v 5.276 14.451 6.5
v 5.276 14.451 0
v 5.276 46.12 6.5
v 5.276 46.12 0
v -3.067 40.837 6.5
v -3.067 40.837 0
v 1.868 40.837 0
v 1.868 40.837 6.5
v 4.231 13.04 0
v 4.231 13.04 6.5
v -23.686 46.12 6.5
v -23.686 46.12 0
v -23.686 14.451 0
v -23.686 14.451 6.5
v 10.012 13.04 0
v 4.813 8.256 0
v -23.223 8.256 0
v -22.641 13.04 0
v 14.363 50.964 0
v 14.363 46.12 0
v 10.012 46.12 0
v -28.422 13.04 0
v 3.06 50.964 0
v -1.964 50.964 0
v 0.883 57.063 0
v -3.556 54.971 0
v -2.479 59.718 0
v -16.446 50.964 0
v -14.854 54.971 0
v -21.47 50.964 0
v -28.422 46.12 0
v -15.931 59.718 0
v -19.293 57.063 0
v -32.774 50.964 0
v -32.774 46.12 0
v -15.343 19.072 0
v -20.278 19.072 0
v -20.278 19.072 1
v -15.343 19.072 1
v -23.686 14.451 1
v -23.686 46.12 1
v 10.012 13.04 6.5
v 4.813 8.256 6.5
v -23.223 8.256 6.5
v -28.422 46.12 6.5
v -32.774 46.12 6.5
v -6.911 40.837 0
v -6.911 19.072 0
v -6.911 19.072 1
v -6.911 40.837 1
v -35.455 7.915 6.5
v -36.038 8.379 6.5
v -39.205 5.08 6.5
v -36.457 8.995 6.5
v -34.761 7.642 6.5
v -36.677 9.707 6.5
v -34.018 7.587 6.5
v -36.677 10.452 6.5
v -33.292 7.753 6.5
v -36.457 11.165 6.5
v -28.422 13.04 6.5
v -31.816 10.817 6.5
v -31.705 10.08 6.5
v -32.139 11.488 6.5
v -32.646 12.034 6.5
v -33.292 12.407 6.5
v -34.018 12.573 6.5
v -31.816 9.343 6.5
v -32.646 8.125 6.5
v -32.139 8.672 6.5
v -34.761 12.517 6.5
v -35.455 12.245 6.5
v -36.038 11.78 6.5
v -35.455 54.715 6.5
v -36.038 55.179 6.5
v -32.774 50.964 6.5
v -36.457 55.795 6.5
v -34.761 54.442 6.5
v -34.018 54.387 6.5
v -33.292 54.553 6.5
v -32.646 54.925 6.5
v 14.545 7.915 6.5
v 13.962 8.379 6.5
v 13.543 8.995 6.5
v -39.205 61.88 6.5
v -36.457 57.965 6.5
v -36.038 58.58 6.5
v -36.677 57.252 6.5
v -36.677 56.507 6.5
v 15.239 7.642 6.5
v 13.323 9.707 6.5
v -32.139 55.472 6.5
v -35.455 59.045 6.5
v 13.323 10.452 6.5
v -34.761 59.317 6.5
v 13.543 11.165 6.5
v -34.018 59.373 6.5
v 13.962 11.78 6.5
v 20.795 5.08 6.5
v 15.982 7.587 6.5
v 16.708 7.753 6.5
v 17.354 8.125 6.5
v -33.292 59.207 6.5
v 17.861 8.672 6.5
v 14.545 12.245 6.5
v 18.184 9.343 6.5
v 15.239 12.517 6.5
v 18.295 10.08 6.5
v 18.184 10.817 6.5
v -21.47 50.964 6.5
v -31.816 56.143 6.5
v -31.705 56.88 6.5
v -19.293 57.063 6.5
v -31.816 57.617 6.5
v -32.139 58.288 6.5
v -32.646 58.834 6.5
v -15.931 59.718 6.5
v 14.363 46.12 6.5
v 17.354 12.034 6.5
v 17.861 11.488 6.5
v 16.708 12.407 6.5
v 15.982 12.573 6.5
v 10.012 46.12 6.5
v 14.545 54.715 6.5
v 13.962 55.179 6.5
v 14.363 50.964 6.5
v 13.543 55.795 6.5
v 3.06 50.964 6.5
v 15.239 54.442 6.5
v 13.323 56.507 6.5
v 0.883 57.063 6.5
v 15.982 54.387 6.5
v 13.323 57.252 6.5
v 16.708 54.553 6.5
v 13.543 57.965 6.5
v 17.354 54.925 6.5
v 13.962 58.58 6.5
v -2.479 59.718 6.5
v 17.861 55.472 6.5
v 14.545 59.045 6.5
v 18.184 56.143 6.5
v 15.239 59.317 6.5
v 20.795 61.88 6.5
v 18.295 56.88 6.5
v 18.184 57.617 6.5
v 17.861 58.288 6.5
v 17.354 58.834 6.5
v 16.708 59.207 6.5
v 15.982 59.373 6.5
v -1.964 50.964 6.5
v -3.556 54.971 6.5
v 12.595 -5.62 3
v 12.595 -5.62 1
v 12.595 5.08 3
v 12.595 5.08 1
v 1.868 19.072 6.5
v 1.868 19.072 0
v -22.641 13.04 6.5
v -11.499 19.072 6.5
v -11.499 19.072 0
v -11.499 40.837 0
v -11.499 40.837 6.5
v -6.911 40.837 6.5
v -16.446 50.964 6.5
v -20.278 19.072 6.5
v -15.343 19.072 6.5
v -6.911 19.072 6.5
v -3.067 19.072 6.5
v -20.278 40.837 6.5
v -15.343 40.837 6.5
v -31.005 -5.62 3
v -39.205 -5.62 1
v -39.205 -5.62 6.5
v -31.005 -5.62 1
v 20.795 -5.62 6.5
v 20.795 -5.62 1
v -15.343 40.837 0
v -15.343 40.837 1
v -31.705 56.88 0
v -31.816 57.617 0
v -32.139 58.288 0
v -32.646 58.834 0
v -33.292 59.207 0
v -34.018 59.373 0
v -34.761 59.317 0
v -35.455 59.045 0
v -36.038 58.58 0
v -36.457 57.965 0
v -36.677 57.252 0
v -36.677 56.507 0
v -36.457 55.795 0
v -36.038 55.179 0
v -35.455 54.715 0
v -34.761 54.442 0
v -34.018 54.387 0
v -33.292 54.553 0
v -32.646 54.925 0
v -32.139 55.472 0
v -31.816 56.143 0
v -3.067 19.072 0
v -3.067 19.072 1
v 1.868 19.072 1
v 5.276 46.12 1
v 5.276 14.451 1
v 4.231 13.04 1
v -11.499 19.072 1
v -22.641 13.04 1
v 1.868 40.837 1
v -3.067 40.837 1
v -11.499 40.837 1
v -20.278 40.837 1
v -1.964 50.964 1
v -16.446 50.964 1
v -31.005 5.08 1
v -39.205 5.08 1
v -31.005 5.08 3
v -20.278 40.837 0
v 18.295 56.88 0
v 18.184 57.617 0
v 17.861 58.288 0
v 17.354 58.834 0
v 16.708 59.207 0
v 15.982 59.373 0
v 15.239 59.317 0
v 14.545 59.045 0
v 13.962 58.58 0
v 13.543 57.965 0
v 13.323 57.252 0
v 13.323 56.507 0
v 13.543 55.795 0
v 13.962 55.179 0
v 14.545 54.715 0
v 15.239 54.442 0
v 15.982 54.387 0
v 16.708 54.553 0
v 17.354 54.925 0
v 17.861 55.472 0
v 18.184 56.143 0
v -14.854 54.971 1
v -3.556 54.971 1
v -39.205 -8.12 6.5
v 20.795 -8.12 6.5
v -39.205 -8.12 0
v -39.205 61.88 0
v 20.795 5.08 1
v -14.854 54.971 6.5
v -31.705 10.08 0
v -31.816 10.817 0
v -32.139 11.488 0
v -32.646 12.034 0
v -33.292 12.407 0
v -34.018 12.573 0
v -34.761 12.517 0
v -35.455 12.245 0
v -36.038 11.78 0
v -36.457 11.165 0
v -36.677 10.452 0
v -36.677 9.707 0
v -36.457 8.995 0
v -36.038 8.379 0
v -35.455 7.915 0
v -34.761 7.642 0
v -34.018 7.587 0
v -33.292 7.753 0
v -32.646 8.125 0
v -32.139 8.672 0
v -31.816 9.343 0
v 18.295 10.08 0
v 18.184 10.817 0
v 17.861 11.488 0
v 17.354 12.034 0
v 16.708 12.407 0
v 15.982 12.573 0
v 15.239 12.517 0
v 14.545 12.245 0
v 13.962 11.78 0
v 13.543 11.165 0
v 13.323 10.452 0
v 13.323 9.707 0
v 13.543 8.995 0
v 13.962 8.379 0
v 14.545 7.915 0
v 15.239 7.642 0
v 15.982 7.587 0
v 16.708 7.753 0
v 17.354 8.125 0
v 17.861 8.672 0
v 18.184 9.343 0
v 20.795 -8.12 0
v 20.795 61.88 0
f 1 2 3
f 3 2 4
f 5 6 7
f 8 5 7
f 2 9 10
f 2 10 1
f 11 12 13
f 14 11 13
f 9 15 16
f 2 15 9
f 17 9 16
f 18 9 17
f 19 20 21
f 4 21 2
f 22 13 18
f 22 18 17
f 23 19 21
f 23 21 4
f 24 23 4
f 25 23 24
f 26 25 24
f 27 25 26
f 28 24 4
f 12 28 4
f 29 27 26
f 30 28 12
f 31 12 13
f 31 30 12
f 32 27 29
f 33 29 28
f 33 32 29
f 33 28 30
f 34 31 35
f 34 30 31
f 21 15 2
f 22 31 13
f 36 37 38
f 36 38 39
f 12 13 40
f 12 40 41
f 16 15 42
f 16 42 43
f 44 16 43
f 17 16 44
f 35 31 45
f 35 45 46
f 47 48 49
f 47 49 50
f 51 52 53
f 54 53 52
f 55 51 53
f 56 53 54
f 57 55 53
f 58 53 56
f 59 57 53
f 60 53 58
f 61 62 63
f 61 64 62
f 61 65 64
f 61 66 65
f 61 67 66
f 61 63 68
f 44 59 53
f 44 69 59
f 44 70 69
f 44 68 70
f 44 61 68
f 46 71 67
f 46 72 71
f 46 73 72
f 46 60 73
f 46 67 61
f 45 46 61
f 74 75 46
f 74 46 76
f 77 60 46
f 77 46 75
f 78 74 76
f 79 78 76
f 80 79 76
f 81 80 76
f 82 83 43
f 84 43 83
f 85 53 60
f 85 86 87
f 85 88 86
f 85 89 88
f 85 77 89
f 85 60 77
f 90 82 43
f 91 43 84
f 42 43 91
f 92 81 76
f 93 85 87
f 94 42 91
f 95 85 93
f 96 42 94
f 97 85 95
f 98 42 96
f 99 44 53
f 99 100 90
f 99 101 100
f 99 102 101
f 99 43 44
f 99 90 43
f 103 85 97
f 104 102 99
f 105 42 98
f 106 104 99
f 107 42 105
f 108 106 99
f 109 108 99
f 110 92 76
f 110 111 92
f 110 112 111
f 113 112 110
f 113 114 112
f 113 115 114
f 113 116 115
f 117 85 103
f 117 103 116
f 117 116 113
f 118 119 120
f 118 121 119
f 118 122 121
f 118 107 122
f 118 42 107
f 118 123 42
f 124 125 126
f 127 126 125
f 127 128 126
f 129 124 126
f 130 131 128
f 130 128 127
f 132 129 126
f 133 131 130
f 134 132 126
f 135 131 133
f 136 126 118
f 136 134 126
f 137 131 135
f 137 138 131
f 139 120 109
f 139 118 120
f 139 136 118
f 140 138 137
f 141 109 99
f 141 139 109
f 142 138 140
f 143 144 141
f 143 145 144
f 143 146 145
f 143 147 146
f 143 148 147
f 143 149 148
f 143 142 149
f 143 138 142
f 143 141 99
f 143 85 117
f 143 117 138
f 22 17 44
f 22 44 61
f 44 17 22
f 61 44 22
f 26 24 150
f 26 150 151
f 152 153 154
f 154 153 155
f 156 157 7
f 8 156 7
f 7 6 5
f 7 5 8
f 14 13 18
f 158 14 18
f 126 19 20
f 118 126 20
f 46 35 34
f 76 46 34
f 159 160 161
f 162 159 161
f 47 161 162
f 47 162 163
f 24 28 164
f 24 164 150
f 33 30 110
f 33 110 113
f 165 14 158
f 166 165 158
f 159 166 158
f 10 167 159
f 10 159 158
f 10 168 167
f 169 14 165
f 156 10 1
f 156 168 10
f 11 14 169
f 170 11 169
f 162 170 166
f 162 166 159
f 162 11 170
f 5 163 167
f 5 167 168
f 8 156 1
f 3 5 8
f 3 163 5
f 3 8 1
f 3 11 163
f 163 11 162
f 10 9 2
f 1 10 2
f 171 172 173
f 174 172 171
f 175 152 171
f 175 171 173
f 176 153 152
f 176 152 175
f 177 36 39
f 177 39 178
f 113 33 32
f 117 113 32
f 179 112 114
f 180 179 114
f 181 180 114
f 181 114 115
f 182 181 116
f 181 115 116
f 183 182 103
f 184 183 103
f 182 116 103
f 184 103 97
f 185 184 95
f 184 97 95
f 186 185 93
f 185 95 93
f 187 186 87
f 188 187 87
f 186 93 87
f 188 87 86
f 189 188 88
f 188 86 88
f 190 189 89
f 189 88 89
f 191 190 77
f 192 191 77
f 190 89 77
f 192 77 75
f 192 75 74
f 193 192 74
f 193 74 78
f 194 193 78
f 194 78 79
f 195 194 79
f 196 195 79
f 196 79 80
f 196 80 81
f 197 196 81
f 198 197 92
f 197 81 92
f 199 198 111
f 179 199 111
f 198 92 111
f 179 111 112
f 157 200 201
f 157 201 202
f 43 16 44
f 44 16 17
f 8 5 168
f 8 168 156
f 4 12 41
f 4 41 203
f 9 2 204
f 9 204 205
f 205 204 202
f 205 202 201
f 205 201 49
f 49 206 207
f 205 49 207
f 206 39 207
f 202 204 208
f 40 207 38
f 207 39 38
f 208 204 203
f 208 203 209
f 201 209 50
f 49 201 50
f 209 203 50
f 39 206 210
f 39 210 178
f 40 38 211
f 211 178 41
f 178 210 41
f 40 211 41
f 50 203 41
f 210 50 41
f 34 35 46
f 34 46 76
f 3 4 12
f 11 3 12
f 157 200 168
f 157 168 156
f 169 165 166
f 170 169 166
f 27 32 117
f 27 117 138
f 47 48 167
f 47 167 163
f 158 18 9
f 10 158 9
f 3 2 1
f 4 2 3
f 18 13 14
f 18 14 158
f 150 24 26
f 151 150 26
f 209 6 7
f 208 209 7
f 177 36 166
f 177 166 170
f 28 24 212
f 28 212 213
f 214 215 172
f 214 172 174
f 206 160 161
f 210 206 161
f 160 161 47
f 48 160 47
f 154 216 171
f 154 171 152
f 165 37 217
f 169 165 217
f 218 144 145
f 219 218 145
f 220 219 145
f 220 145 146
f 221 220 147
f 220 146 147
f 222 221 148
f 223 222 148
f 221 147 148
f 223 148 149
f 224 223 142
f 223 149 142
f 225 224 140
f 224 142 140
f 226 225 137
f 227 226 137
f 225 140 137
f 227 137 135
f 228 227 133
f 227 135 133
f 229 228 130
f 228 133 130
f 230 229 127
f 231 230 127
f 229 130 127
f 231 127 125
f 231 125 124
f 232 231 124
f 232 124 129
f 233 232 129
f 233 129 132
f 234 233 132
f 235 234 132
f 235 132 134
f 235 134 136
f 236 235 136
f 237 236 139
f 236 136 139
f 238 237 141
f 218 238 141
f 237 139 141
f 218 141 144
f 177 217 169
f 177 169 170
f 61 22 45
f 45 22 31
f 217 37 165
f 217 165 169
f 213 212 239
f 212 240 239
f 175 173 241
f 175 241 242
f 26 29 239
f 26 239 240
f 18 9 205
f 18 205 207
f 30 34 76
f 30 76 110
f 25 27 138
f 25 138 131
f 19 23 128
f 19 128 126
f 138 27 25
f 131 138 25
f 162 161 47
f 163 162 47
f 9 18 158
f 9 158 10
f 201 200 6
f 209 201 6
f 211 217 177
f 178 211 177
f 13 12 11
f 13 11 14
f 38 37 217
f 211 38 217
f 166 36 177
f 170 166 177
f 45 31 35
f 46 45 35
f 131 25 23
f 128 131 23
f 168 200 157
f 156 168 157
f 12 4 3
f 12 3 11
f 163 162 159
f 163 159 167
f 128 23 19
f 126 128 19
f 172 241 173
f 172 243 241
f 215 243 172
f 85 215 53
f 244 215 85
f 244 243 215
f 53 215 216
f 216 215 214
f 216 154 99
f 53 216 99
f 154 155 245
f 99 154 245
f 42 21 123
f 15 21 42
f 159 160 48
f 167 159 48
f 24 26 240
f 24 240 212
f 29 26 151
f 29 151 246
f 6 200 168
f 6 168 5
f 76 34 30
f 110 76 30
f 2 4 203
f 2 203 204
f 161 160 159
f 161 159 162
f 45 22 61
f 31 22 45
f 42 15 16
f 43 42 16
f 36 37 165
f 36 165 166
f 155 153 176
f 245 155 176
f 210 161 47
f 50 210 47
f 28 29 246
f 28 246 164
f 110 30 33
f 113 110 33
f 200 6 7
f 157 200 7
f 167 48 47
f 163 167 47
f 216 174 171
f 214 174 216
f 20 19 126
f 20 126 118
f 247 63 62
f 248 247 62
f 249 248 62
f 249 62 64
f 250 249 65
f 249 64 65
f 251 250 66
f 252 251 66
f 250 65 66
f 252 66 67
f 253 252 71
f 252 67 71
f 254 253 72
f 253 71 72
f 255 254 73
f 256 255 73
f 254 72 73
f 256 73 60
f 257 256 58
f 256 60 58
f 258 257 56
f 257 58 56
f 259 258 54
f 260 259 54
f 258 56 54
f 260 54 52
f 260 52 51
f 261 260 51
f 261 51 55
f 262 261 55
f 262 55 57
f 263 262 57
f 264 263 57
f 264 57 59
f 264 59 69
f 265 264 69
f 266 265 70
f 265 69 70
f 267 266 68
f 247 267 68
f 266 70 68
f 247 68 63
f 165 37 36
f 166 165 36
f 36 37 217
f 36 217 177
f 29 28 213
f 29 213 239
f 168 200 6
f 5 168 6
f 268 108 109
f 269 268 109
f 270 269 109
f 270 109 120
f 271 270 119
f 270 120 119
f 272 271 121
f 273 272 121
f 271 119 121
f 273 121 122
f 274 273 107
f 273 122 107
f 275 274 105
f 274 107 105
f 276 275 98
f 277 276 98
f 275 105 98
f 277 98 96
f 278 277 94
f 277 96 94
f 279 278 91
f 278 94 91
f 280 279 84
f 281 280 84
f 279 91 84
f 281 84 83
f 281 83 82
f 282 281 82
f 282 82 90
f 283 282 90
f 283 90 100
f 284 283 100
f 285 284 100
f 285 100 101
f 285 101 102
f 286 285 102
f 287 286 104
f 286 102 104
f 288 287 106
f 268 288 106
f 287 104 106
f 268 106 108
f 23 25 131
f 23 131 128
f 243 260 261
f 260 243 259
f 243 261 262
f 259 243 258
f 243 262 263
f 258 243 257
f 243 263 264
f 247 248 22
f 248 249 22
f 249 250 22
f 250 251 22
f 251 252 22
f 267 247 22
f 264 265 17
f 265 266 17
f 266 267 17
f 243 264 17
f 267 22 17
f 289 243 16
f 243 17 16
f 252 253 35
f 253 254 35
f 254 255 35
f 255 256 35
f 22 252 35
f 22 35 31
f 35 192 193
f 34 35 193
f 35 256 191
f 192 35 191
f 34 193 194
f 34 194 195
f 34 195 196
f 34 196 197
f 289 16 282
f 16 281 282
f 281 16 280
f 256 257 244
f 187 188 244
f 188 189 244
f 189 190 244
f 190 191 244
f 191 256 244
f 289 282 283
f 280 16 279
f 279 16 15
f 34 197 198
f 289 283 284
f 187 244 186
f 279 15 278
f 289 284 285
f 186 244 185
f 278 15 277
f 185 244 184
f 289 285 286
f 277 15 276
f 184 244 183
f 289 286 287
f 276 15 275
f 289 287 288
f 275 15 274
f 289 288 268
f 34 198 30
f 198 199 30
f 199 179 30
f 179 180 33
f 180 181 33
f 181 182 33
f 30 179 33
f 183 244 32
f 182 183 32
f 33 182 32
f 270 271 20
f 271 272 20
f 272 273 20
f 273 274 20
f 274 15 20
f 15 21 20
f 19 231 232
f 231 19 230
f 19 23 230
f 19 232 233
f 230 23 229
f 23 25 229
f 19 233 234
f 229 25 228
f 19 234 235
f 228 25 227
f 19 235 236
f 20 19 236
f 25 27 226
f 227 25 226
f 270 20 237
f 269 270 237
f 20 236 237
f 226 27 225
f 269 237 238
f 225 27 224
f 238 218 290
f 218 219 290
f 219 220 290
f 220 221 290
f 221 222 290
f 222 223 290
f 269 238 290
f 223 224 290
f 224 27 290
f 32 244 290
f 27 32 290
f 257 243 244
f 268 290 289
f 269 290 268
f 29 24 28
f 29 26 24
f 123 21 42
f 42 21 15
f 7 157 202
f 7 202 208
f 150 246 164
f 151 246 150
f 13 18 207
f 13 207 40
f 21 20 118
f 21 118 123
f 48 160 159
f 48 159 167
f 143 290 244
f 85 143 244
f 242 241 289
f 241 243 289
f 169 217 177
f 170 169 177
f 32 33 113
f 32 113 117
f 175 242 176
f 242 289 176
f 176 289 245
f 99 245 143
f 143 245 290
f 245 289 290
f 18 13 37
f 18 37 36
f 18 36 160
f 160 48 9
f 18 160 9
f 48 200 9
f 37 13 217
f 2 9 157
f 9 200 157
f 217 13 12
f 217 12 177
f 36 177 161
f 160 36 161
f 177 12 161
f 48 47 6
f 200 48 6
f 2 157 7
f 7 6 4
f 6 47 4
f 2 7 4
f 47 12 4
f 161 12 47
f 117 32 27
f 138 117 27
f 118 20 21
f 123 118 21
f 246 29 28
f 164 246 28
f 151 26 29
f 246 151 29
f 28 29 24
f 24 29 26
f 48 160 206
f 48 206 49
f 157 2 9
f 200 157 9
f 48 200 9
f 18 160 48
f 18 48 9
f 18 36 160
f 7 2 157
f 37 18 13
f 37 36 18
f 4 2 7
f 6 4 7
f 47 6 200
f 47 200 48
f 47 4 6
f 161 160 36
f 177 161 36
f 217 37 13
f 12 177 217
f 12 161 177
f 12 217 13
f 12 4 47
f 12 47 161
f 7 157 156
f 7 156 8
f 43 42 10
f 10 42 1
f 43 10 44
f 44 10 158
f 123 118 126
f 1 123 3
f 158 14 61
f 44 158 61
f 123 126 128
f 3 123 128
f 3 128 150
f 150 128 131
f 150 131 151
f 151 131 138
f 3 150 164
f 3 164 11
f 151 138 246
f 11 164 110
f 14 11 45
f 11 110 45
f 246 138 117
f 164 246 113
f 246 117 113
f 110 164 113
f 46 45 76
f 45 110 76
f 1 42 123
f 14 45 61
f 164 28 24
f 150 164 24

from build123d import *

# Parameters (mm, degrees)
SKETCH1_W               = 60
SKETCH1_H               = 70
BACK_PLATE_DEPTH        = 1
SKETCH1_W_2             = 4.935143629
SKETCH1_H_2             = 21.765245327
SKETCH1_W_3             = 4.588042919
SKETCH1_W_4             = 4.93514363
BACK_PLATE_2_DEPTH      = 1
BACK_PLATE_3_DEPTH      = 1
SKETCH1_4_W             = 43.6
SKETCH1_4_H             = 10.7
NEOPIXEL_BACK_DEPTH     = 3
SKETCH1_5_W             = 60
SKETCH1_5_H             = 56.8
SKETCH1_5_H_2           = 2.5
SKETCH1_5_W_2           = 4.935143629
SKETCH1_5_H_3           = 21.765245327
SKETCH1_5_W_3           = 4.588042919
SKETCH1_5_W_4           = 4.93514363
MAIN_COLOR_DEPTH        = 6.5
SKETCH2_R               = 2.5
MOUNTING_HOLES_DEPTH    = 6.5
HIGHLIGHT_COLOR_DEPTH   = 6.5
SKETCH1_7_W             = 4.588042919
SKETCH1_7_H             = 21.765245327
HIGHLIGHT_COLOR_2_DEPTH = 6.5
SKETCH1_7_W_2           = 4.935143629
HIGHLIGHT_COLOR_3_DEPTH = 6.5
SKETCH1_7_W_3           = 4.93514363
HIGHLIGHT_COLOR_4_DEPTH = 6.5


with BuildPart() as part:
    # Sketch1 → Back Plate (new body)
    with BuildSketch(Plane.XY):
        with Locations((-9.205009354, 26.879816243)):
            Rectangle(SKETCH1_W, SKETCH1_H)
        Polygon((-15.931296548, 59.717901756), (-2.47872216, 59.717901756), (0.883053973, 57.06304042), (3.059892719, 50.964477844), (14.363498017, 50.964477844), (14.363498017, 46.120048266), (10.011810175, 46.120048266), (10.011810175, 13.040245025), (4.81261813, 8.256222922), (-23.222636838, 8.256222922), (-28.421828882, 13.040245025), (-28.421828882, 46.120048266), (-32.773516724, 46.120048266), (-32.773516724, 50.964477844), (-21.469911426, 50.964477844), (-19.293072681, 57.06304042), align=None, mode=Mode.SUBTRACT)
    extrude(amount=BACK_PLATE_DEPTH)

    # Sketch1<4> → Neopixel Back (add)
    with BuildSketch(Plane.XY):
        with Locations((-9.205009354, -0.270183757)):
            Rectangle(SKETCH1_4_W, SKETCH1_4_H)
    extrude(amount=NEOPIXEL_BACK_DEPTH)

    # Sketch1<5> → Main Color (add)
    # profile 1 of 4: a face of its own
    with BuildSketch(Plane.XY):
        with Locations((-9.205009354, 33.479816243)):
            Rectangle(SKETCH1_5_W, SKETCH1_5_H)
        Polygon((-15.931296548, 59.717901756), (-2.47872216, 59.717901756), (0.883053973, 57.06304042), (3.059892719, 50.964477844), (14.363498017, 50.964477844), (14.363498017, 46.120048266), (10.011810175, 46.120048266), (10.011810175, 13.040245025), (4.81261813, 8.256222922), (-23.222636838, 8.256222922), (-28.421828882, 13.040245025), (-28.421828882, 46.120048266), (-32.773516724, 46.120048266), (-32.773516724, 50.964477844), (-21.469911426, 50.964477844), (-19.293072681, 57.06304042), align=None, mode=Mode.SUBTRACT)
    # profile 2 of 4: a face of its own
    with BuildSketch(Plane.XY):
        with Locations((-9.205009354, -6.870183757)):
            Rectangle(SKETCH1_5_W, SKETCH1_5_H_2)
    # profile 3 of 4: a face of its own
    with BuildSketch(Plane.XY):
        Polygon((-22.641480327, 13.040245025), (4.231461619, 13.040245025), (5.27634955, 14.450671464), (5.27634955, 46.120048266), (-23.686368257, 46.120048266), (-23.686368257, 14.450671464), align=None)
        with Locations((-17.810401185, 29.954349556)):
            Rectangle(SKETCH1_5_W_2, SKETCH1_5_H_3, mode=Mode.SUBTRACT)
        with Locations((-9.205009354, 29.954349556)):
            Rectangle(SKETCH1_5_W_3, SKETCH1_5_H_3, mode=Mode.SUBTRACT)
        with Locations((-0.599617523, 29.954349556)):
            Rectangle(SKETCH1_5_W_4, SKETCH1_5_H_3, mode=Mode.SUBTRACT)
    # profile 4 of 4: a face of its own
    with BuildSketch(Plane.XY):
        Polygon((-16.445688805, 50.964477844), (-1.964329902, 50.964477844), (-3.556374782, 54.971486207), (-14.853643925, 54.971486207), align=None)
    extrude(amount=MAIN_COLOR_DEPTH)


with BuildPart() as body_2:
    # Sketch1 → Back Plate 2 (new body)
    with BuildSketch(Plane.XY):
        Polygon((-22.641480327, 13.040245025), (4.231461619, 13.040245025), (5.27634955, 14.450671464), (5.27634955, 46.120048266), (-23.686368257, 46.120048266), (-23.686368257, 14.450671464), align=None)
        with Locations((-17.810401185, 29.954349556)):
            Rectangle(SKETCH1_W_2, SKETCH1_H_2, mode=Mode.SUBTRACT)
        with Locations((-9.205009354, 29.954349556)):
            Rectangle(SKETCH1_W_3, SKETCH1_H_2, mode=Mode.SUBTRACT)
        with Locations((-0.599617523, 29.954349556)):
            Rectangle(SKETCH1_W_4, SKETCH1_H_2, mode=Mode.SUBTRACT)
    extrude(amount=BACK_PLATE_2_DEPTH)


with BuildPart() as body_3:
    # Sketch1 → Back Plate 3 (new body)
    with BuildSketch(Plane.XY):
        Polygon((-16.445688805, 50.964477844), (-1.964329902, 50.964477844), (-3.556374782, 54.971486207), (-14.853643925, 54.971486207), align=None)
    extrude(amount=BACK_PLATE_3_DEPTH)


with BuildPart() as main_color_piece_1:
    # of the separate pieces the step leaves, piece 1, a body of its own (main_color_pieces)
    add(part.part.solids().sort_by_distance((20.794990646, 61.879816243, 6.5))[0])

    # Sketch2 → Mounting Holes (cut)
    with BuildSketch(Plane.XY.offset(6.5)):
        with Locations((-34.205009354, 56.879816243)):
            Circle(SKETCH2_R)
        with Locations((15.794990646, 56.879816243)):
            Circle(SKETCH2_R)
        with Locations((-34.205009354, 10.079816243)):
            Circle(SKETCH2_R)
        with Locations((15.794990646, 10.079816243)):
            Circle(SKETCH2_R)
    extrude(amount=-MOUNTING_HOLES_DEPTH, mode=Mode.SUBTRACT)


with BuildPart() as main_color_piece_2:
    # of the separate pieces the step leaves, piece 2, a body of its own (main_color_pieces)
    add(part.part.solids().sort_by_distance((-22.641480327, 13.040245025, 0))[0])


with BuildPart() as main_color_piece_3:
    # of the separate pieces the step leaves, piece 3, a body of its own (main_color_pieces)
    add(part.part.solids().sort_by_distance((-16.445688805, 50.964477844, 0))[0])


with BuildPart() as body_6:
    # Sketch1<7> → Highlight Color (new body)
    with BuildSketch(Plane.XY):
        Polygon((0.883053973, 57.06304042), (-2.47872216, 59.717901756), (-15.931296548, 59.717901756), (-19.293072681, 57.06304042), (-21.469911426, 50.964477844), (-32.773516724, 50.964477844), (-32.773516724, 46.120048266), (-28.421828882, 46.120048266), (-28.421828882, 13.040245025), (-23.222636838, 8.256222922), (4.81261813, 8.256222922), (10.011810175, 13.040245025), (10.011810175, 46.120048266), (14.363498017, 46.120048266), (14.363498017, 50.964477844), (3.059892719, 50.964477844), align=None)
        Polygon((5.27634955, 14.450671464), (4.231461619, 13.040245025), (-22.641480327, 13.040245025), (-23.686368257, 14.450671464), (-23.686368257, 46.120048266), (5.27634955, 46.120048266), align=None, mode=Mode.SUBTRACT)
        Polygon((-3.556374782, 54.971486207), (-1.964329902, 50.964477844), (-16.445688805, 50.964477844), (-14.853643925, 54.971486207), align=None, mode=Mode.SUBTRACT)
    extrude(amount=HIGHLIGHT_COLOR_DEPTH)


with BuildPart() as body_7:
    # Sketch1<7> → Highlight Color 2 (new body)
    with BuildSketch(Plane.XY):
        with Locations((-9.205009354, 29.954349556)):
            Rectangle(SKETCH1_7_W, SKETCH1_7_H)
    extrude(amount=HIGHLIGHT_COLOR_2_DEPTH)


with BuildPart() as body_8:
    # Sketch1<7> → Highlight Color 3 (new body)
    with BuildSketch(Plane.XY):
        with Locations((-17.810401185, 29.954349556)):
            Rectangle(SKETCH1_7_W_2, SKETCH1_7_H)
    extrude(amount=HIGHLIGHT_COLOR_3_DEPTH)


with BuildPart() as body_9:
    # Sketch1<7> → Highlight Color 4 (new body)
    with BuildSketch(Plane.XY):
        with Locations((-0.599617523, 29.954349556)):
            Rectangle(SKETCH1_7_W_3, SKETCH1_7_H)
    extrude(amount=HIGHLIGHT_COLOR_4_DEPTH)


solid = Compound([body_2.part, body_3.part, main_color_piece_1.part, main_color_piece_2.part, main_color_piece_3.part, body_6.part, body_7.part, body_8.part, body_9.part])
